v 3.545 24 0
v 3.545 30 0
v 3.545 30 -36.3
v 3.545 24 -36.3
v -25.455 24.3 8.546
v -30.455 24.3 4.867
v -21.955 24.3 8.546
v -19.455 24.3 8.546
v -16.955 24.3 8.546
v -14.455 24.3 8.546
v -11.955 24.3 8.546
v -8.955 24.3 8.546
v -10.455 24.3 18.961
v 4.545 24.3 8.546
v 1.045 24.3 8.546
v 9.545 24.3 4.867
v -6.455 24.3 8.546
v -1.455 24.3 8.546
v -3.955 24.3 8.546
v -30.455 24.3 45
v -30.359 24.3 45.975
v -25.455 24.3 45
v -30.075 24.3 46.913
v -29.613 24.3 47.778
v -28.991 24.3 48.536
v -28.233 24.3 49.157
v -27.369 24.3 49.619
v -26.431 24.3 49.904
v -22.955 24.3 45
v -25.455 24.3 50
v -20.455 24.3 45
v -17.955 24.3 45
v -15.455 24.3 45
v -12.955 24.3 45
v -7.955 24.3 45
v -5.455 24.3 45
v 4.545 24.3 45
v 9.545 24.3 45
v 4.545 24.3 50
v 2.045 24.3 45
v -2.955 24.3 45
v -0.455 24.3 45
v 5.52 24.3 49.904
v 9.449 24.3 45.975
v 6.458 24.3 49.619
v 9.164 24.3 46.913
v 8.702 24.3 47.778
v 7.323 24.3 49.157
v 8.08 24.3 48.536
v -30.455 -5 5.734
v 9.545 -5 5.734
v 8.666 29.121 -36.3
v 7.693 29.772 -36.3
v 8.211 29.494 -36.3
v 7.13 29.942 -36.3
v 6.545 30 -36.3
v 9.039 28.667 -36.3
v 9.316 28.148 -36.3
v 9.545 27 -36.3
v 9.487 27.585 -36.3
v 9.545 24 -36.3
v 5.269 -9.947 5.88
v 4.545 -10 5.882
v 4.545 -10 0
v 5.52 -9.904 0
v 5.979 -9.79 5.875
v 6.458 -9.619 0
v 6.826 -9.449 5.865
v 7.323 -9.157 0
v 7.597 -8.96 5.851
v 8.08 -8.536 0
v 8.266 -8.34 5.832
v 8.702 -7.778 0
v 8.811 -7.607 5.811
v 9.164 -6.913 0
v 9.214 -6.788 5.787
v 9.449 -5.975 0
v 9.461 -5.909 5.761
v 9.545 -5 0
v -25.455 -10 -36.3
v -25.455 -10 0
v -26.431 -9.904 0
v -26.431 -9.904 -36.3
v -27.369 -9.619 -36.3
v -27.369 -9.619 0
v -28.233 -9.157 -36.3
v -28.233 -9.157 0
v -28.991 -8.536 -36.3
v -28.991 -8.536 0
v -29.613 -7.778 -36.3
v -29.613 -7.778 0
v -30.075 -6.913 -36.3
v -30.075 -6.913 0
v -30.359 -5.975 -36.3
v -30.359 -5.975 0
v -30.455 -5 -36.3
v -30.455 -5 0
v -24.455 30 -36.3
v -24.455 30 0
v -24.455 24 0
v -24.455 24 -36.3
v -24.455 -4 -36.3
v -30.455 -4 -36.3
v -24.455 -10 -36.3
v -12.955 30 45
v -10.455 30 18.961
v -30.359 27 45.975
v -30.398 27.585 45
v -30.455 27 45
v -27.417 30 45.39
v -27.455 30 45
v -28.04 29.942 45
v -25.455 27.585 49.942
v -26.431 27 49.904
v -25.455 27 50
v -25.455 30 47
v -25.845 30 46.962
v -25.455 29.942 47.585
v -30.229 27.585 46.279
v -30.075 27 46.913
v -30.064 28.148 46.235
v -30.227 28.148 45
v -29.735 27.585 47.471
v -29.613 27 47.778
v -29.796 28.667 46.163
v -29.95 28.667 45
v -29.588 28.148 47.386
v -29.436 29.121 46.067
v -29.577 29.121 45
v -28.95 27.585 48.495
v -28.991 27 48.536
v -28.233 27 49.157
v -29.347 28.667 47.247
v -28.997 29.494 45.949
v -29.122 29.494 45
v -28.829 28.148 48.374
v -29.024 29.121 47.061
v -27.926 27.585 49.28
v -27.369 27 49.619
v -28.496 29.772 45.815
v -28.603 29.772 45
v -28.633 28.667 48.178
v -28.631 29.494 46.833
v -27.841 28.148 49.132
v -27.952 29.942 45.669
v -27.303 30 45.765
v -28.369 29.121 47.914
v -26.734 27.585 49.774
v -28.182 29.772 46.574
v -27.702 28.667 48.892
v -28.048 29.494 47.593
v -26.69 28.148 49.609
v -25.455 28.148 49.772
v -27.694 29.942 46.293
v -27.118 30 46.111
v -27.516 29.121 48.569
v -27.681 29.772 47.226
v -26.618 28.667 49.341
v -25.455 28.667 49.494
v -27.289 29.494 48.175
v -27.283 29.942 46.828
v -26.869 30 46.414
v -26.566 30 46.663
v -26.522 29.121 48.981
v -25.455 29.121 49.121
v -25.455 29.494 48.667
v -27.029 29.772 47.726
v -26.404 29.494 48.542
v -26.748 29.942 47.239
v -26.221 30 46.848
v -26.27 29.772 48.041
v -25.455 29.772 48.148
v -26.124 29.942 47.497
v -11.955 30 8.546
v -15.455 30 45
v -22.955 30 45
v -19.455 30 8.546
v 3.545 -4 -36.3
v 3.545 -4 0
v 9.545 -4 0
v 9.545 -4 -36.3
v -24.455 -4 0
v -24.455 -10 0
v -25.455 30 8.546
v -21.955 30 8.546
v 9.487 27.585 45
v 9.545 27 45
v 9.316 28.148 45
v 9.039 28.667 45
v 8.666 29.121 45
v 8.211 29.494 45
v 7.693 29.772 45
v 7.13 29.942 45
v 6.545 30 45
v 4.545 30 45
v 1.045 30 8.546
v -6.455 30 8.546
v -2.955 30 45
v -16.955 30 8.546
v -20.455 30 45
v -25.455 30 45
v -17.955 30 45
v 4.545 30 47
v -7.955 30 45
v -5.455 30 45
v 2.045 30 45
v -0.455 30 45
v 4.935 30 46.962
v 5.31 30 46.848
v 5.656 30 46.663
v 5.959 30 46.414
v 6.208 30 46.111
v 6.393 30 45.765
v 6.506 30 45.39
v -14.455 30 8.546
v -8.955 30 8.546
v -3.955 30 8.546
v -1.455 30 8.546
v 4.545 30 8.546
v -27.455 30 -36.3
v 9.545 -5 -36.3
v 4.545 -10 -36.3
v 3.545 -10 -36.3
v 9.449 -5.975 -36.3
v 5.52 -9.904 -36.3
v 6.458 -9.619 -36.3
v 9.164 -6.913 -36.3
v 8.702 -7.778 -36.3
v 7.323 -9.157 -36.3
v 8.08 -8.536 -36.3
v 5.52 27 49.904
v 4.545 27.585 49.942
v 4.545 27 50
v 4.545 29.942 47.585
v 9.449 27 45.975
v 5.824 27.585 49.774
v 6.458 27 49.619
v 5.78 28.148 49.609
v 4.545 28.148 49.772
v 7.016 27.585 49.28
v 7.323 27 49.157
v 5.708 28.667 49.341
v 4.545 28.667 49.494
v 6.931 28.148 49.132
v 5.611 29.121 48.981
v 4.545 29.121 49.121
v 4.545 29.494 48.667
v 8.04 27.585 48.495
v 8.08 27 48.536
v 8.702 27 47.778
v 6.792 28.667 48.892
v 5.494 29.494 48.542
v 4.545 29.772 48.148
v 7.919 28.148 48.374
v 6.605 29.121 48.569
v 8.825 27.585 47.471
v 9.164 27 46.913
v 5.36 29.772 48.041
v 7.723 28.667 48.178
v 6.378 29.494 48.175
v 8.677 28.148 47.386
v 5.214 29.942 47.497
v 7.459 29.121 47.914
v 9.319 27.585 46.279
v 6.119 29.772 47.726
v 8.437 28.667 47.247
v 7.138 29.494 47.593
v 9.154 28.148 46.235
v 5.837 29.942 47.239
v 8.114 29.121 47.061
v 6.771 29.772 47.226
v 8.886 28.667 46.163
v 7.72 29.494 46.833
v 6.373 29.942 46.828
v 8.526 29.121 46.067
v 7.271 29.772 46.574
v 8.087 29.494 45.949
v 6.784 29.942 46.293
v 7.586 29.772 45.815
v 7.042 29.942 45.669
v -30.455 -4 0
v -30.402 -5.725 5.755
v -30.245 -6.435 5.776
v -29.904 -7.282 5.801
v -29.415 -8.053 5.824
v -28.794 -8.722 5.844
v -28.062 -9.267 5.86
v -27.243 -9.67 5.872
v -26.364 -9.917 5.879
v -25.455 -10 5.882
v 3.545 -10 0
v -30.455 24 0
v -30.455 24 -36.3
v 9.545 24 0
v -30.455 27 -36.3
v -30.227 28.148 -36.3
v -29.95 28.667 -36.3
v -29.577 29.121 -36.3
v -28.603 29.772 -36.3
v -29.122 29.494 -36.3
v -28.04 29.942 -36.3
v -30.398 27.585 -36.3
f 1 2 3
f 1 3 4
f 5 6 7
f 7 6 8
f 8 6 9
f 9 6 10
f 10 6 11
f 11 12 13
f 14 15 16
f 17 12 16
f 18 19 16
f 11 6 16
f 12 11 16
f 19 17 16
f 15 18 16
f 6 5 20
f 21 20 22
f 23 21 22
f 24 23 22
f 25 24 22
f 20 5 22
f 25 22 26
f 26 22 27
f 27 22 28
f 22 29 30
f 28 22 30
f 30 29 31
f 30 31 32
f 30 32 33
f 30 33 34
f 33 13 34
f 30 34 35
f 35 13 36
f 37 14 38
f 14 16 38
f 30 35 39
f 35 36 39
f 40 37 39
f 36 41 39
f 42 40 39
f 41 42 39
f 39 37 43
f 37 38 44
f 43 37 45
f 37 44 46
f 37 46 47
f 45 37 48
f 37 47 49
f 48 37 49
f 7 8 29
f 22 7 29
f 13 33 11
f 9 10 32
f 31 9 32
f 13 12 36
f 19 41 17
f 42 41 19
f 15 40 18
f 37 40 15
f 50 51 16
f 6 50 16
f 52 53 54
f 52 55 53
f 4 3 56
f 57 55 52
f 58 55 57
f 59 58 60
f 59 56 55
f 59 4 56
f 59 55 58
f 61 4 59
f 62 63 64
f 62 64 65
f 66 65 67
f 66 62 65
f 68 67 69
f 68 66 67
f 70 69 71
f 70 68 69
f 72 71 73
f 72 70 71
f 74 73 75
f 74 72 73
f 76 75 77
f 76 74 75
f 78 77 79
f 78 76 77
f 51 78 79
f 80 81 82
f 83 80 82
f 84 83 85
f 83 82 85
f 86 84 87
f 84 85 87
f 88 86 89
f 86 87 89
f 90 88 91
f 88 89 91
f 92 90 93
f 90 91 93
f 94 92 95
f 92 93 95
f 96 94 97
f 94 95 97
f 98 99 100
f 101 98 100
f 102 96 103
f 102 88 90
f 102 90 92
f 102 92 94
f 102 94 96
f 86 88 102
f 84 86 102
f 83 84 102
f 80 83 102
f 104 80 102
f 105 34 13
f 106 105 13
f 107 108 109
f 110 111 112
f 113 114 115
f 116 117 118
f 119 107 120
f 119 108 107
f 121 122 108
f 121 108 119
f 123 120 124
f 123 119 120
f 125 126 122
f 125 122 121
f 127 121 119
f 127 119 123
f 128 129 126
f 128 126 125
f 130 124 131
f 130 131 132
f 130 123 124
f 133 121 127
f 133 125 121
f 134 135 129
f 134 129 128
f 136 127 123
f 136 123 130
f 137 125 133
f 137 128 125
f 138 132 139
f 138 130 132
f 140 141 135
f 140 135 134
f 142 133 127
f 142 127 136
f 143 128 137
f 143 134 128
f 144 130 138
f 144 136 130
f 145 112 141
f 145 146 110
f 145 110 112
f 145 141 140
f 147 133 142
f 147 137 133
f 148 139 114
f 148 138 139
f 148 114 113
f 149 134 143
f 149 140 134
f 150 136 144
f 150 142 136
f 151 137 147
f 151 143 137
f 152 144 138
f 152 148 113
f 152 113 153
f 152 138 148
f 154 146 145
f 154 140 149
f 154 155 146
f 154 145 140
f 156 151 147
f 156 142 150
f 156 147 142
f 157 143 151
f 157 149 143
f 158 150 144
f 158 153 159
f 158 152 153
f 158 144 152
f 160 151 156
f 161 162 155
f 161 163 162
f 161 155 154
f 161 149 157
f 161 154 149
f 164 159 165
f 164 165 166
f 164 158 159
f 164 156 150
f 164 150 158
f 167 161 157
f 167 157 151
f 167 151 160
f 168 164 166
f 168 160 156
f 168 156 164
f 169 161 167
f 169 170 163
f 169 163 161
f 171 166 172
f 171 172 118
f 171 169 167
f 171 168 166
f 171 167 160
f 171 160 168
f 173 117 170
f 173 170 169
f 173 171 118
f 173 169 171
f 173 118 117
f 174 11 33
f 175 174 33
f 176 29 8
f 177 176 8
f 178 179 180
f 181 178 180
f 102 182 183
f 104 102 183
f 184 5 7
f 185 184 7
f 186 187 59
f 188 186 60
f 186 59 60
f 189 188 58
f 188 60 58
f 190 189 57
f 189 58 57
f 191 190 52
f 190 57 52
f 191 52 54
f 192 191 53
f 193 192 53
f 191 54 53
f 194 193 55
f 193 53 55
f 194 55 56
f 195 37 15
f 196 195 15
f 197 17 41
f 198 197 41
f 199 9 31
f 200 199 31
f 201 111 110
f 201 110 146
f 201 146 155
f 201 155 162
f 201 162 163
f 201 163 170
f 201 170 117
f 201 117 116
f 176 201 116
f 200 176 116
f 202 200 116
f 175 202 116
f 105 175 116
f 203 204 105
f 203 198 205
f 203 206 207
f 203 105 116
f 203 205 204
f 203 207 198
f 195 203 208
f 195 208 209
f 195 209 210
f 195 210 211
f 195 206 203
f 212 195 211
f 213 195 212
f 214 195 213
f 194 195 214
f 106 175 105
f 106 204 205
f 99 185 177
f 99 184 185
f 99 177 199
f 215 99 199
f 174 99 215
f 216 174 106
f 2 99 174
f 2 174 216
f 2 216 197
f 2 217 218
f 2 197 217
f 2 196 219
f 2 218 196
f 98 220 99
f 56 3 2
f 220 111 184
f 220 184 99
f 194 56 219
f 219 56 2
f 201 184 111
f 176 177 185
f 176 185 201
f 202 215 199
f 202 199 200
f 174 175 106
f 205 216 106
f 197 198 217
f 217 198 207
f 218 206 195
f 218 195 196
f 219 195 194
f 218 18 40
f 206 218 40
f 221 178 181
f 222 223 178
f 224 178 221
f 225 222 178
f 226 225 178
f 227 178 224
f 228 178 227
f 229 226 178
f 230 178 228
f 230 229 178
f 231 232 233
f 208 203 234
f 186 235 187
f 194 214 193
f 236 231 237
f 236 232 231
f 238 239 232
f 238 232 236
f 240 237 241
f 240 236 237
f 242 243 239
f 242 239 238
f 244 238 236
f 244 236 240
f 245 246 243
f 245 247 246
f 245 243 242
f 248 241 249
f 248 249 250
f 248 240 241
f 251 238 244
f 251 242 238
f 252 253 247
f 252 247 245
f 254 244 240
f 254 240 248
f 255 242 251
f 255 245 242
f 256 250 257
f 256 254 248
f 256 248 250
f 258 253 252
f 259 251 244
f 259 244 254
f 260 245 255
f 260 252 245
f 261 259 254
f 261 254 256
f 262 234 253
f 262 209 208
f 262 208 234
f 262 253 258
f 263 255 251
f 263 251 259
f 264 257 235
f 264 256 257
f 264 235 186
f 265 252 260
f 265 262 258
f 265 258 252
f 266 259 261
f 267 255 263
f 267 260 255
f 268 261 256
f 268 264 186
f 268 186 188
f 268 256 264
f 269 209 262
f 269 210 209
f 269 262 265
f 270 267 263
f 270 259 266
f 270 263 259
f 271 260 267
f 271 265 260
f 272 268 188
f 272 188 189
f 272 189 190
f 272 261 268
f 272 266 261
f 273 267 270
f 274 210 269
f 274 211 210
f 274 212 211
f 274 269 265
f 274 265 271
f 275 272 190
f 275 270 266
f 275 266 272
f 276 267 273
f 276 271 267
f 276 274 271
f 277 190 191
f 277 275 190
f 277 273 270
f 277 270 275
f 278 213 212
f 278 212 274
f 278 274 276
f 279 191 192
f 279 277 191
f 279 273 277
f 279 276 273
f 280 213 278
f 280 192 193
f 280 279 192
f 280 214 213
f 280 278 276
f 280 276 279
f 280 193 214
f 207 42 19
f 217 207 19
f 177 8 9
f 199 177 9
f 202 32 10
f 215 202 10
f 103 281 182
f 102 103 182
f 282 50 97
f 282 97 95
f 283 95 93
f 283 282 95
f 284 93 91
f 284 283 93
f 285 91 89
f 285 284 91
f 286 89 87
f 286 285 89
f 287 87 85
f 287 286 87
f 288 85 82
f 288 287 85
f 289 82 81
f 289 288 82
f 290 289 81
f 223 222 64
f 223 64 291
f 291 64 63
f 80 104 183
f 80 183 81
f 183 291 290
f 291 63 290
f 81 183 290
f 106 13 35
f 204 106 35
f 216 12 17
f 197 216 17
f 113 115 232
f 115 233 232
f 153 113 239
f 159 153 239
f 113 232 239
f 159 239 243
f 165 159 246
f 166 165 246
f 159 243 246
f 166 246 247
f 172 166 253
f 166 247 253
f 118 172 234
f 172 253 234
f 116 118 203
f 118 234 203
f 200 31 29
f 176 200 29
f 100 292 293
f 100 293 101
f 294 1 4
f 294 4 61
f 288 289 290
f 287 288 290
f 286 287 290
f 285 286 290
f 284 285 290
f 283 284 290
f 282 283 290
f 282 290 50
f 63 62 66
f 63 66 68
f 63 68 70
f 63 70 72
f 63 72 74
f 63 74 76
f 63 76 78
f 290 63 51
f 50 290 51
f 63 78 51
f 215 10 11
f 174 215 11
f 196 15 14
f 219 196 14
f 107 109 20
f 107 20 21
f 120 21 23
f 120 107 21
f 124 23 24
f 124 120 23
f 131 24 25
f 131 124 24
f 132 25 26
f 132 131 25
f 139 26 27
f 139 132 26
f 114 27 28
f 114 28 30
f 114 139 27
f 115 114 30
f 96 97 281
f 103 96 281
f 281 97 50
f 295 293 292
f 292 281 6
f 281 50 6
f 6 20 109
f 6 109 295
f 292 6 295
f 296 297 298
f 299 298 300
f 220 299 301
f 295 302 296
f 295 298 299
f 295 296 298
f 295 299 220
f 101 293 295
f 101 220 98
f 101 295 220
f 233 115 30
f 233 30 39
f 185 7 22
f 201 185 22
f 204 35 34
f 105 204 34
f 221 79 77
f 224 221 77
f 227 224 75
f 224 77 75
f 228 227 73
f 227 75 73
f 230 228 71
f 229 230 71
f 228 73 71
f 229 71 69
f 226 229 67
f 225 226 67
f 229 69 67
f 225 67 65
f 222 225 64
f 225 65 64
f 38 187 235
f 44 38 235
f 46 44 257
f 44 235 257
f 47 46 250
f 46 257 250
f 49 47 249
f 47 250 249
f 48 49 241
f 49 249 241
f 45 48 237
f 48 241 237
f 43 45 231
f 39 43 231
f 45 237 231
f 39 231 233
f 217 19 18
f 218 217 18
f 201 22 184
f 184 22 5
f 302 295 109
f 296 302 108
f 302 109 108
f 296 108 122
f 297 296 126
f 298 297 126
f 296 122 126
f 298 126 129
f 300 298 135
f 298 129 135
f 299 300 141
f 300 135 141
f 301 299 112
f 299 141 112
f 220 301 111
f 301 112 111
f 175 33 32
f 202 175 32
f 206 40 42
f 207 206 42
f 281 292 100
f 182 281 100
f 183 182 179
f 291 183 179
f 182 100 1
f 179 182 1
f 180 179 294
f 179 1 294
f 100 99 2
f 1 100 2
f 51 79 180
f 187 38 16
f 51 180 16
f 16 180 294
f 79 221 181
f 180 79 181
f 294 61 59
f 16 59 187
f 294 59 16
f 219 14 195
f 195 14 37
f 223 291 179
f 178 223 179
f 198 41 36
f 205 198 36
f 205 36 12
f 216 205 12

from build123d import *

# Parameters (mm, degrees)
F1_DEPTH  = 6
F2_R      = 5
F3_W      = 40
F3_H      = 5.699848
F4_DEPTH  = 44
F5_R      = 5
F7_DEPTH  = 25
F8_W      = 6
F8_H      = 6
F9_DEPTH  = 36.3
F10_R     = 3
F11_DEPTH = 25
F13_DEPTH = 49.1


with BuildPart() as f1:
    # F0 (on Top) → F1 (new body)
    with BuildSketch(Plane.XY):
        Polygon((-30.455219, 30), (-30.455219, 0), (-30.455219, -10), (9.544781, -10), (9.544781, 30), align=None)
    extrude(amount=F1_DEPTH)

    # F2
    f2_edges = [f1.edges().sort_by_distance(p)[0] for p in [
        (-30.455219, -10, 3),
        (9.544781, -10, 3),
    ]]
    fillet(f2_edges, radius=F2_R)

    # F3 (on face) → F4 (join)
    with BuildSketch(Plane.XY.offset(6)):
        with Locations((-10.455219, 27.150076)):
            Rectangle(F3_W, F3_H)
    extrude(amount=F4_DEPTH)

    # F5
    f5_edges = [f1.edges().sort_by_distance(p)[0] for p in [
        (-30.455219, 27.150076, 50),
        (9.544781, 27.150076, 50),
    ]]
    fillet(f5_edges, radius=F5_R)

    # F6 (on face) → F7 (cut)
    with BuildSketch(Plane.XZ.offset(-24.300152)):
        Polygon((-21.955219, 8.545761), (-25.455219, 45), (-25.455219, 8.545761), align=None)
        Polygon((-20.455219, 45), (-22.955219, 45), (-19.455219, 8.545761), (-16.955219, 8.545761), align=None)
        Polygon((-15.455219, 45), (-17.955219, 45), (-14.455219, 8.545761), (-11.955219, 8.545761), align=None)
        Polygon((-5.455219, 45), (-8.955219, 8.545761), (-6.455219, 8.545761), (-2.955219, 45), align=None)
        Polygon((-0.455219, 45), (-3.955219, 8.545761), (-1.455219, 8.545761), (2.044781, 45), align=None)
        Polygon((4.544781, 45), (1.044781, 8.545761), (4.544781, 8.545761), align=None)
    extrude(amount=-F7_DEPTH, mode=Mode.SUBTRACT)

    # F8 (on face) → F9 (join)
    with BuildSketch(Plane(origin=(0, 0, 0), x_dir=(1, 0, 0), z_dir=(0, 0, -1))):
        with BuildLine():
            Line((-30.455219, 5), (-30.455219, 4))
            Line((-30.455219, 4), (-24.455219, 4))
            Line((-24.455219, 4), (-24.455219, 10))
            Line((-24.455219, 10), (-25.455219, 10))
            ThreePointArc((-25.455219, 10), (-28.990753, 8.535534), (-30.455219, 5))
        make_face()
        with BuildLine():
            Line((4.544781, 10), (3.544781, 10))
            Line((3.544781, 10), (3.544781, 4))
            Line((3.544781, 4), (9.544781, 4))
            Line((9.544781, 4), (9.544781, 5))
            ThreePointArc((9.544781, 5), (8.080315, 8.535534), (4.544781, 10))
        make_face()
        with Locations((-27.455219, -27)):
            Rectangle(F8_W, F8_H)
        with Locations((6.544781, -27)):
            Rectangle(F8_W, F8_H)
    extrude(amount=F9_DEPTH)

    # F10
    f10_edges = [f1.edges().sort_by_distance(p)[0] for p in [
        (9.544781, 30, 4.35),
    ]]
    fillet(f10_edges, radius=F10_R)

    # F6 (on face) → F11 (cut)
    with BuildSketch(Plane.XZ.offset(-24.300152)):
        Polygon((-7.955219, 45), (-12.955219, 45), (-10.455219, 18.961258), align=None)
    extrude(amount=-F11_DEPTH, mode=Mode.SUBTRACT)

    # F12 (on face) → F13 (cut)
    with BuildSketch(Plane.YZ.offset(9.544781)):
        Polygon((-5, 6), (-5, 5.73364), (24.300152, 4.866716), (24.300152, 6), align=None)
        Polygon((24.300152, 7.596356), (-13.065776, 5.972288), (-5, 5.73364), (-5, 6), (24.300152, 6), align=None)
    extrude(amount=-F13_DEPTH, mode=Mode.SUBTRACT)


solid = f1.part
